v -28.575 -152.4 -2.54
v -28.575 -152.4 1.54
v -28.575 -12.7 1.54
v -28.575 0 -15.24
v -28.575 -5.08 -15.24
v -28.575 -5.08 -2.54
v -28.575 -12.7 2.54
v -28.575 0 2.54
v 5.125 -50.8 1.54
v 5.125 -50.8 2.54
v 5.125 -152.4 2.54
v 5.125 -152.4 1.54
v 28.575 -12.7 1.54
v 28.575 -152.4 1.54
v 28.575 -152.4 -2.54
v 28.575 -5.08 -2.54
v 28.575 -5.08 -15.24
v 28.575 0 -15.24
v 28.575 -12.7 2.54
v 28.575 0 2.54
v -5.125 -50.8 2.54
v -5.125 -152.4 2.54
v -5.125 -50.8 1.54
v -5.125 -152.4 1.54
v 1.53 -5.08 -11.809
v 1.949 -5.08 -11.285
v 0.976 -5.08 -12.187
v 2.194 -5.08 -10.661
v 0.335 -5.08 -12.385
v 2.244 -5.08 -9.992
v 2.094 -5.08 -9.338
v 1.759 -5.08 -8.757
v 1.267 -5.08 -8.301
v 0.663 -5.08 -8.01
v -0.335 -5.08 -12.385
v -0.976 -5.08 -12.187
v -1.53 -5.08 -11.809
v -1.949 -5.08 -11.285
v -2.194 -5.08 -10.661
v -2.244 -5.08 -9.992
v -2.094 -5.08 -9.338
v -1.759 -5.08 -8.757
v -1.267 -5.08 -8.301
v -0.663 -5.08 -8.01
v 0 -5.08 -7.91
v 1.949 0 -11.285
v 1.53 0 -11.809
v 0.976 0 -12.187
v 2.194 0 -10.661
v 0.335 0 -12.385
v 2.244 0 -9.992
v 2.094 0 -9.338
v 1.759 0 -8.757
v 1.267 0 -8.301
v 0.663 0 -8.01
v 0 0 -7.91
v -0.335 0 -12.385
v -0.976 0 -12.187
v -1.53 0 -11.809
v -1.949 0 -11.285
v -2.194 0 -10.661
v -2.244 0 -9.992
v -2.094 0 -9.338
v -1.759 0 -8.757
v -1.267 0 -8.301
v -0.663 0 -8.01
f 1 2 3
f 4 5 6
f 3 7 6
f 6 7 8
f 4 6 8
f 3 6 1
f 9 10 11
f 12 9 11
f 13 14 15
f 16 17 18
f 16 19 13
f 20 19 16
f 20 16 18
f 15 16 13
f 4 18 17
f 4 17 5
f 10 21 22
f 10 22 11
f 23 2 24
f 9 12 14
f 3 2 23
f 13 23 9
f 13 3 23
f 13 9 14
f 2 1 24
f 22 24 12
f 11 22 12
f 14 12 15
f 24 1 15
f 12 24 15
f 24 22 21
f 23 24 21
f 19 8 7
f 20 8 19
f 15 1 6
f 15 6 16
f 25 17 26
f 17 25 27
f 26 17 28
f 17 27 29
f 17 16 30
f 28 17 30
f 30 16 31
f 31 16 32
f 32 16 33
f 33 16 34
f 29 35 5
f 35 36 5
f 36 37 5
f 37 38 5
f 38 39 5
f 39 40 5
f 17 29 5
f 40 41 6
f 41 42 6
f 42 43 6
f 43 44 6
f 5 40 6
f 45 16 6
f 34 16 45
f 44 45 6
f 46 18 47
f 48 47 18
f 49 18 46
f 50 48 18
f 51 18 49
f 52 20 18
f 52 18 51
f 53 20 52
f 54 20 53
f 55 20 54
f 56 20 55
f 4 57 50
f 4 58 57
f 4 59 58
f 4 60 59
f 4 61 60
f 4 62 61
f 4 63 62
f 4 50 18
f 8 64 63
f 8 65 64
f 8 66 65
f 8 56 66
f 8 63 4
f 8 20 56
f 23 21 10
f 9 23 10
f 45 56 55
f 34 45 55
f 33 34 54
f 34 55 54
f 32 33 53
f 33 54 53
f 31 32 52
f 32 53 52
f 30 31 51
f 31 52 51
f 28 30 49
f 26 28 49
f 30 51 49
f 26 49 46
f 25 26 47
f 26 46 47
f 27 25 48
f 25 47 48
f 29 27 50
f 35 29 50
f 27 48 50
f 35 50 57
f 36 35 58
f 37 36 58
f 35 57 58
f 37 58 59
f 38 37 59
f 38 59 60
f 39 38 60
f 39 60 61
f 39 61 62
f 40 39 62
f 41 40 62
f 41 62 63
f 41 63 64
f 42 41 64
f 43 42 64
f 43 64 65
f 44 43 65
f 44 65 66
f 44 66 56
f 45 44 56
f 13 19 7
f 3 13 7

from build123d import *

# Parameters (mm, degrees)
SKETCH1_W           = 57.15
SKETCH1_H           = 5.08
BOSS_EXTRUDE1_DEPTH = 152.4
CUT_EXTRUDE1_DEPTH  = 1
SKETCH3_W           = 57.15
SKETCH3_H           = 5.08
BOSS_EXTRUDE2_DEPTH = 12.7
SKETCH4_R           = 2.25
CUT_EXTRUDE2_DEPTH  = 12.7


with BuildPart() as part:
    # Sketch1 → Boss-Extrude1 (new body)
    with BuildSketch(Plane(origin=(0, 0, 0), x_dir=(1, 0, 0), z_dir=(0, 1, 0))):
        Rectangle(SKETCH1_W, SKETCH1_H)
    extrude(amount=-BOSS_EXTRUDE1_DEPTH)

    # Sketch2 → Cut-Extrude1 (cut)
    with BuildSketch(Plane.XY.offset(2.54)):
        Polygon((-5.125, -152.4), (-5.125, -50.8), (5.125, -50.8), (5.125, -152.4), (28.575, -152.4), (28.575, -12.7), (-28.575, -12.7), (-28.575, -152.4), align=None)
    extrude(amount=-CUT_EXTRUDE1_DEPTH, mode=Mode.SUBTRACT)

    # Sketch3 → Boss-Extrude2 (add)
    with BuildSketch(Plane(origin=(0, 0, -2.54), x_dir=(-1, 0, 0), z_dir=(0, 0, -1))):
        with Locations((0, -2.54)):
            Rectangle(SKETCH3_W, SKETCH3_H)
    extrude(amount=BOSS_EXTRUDE2_DEPTH)

    # Sketch4 → Cut-Extrude2 (cut)
    with BuildSketch(Plane(origin=(0, 0, 0), x_dir=(1, 0, 0), z_dir=(0, 1, 0))):
        with Locations(Location((0, 10.16, 0), (0, 0, 270))):
            Circle(SKETCH4_R)
    extrude(amount=-CUT_EXTRUDE2_DEPTH, mode=Mode.SUBTRACT)


solid = part.part
